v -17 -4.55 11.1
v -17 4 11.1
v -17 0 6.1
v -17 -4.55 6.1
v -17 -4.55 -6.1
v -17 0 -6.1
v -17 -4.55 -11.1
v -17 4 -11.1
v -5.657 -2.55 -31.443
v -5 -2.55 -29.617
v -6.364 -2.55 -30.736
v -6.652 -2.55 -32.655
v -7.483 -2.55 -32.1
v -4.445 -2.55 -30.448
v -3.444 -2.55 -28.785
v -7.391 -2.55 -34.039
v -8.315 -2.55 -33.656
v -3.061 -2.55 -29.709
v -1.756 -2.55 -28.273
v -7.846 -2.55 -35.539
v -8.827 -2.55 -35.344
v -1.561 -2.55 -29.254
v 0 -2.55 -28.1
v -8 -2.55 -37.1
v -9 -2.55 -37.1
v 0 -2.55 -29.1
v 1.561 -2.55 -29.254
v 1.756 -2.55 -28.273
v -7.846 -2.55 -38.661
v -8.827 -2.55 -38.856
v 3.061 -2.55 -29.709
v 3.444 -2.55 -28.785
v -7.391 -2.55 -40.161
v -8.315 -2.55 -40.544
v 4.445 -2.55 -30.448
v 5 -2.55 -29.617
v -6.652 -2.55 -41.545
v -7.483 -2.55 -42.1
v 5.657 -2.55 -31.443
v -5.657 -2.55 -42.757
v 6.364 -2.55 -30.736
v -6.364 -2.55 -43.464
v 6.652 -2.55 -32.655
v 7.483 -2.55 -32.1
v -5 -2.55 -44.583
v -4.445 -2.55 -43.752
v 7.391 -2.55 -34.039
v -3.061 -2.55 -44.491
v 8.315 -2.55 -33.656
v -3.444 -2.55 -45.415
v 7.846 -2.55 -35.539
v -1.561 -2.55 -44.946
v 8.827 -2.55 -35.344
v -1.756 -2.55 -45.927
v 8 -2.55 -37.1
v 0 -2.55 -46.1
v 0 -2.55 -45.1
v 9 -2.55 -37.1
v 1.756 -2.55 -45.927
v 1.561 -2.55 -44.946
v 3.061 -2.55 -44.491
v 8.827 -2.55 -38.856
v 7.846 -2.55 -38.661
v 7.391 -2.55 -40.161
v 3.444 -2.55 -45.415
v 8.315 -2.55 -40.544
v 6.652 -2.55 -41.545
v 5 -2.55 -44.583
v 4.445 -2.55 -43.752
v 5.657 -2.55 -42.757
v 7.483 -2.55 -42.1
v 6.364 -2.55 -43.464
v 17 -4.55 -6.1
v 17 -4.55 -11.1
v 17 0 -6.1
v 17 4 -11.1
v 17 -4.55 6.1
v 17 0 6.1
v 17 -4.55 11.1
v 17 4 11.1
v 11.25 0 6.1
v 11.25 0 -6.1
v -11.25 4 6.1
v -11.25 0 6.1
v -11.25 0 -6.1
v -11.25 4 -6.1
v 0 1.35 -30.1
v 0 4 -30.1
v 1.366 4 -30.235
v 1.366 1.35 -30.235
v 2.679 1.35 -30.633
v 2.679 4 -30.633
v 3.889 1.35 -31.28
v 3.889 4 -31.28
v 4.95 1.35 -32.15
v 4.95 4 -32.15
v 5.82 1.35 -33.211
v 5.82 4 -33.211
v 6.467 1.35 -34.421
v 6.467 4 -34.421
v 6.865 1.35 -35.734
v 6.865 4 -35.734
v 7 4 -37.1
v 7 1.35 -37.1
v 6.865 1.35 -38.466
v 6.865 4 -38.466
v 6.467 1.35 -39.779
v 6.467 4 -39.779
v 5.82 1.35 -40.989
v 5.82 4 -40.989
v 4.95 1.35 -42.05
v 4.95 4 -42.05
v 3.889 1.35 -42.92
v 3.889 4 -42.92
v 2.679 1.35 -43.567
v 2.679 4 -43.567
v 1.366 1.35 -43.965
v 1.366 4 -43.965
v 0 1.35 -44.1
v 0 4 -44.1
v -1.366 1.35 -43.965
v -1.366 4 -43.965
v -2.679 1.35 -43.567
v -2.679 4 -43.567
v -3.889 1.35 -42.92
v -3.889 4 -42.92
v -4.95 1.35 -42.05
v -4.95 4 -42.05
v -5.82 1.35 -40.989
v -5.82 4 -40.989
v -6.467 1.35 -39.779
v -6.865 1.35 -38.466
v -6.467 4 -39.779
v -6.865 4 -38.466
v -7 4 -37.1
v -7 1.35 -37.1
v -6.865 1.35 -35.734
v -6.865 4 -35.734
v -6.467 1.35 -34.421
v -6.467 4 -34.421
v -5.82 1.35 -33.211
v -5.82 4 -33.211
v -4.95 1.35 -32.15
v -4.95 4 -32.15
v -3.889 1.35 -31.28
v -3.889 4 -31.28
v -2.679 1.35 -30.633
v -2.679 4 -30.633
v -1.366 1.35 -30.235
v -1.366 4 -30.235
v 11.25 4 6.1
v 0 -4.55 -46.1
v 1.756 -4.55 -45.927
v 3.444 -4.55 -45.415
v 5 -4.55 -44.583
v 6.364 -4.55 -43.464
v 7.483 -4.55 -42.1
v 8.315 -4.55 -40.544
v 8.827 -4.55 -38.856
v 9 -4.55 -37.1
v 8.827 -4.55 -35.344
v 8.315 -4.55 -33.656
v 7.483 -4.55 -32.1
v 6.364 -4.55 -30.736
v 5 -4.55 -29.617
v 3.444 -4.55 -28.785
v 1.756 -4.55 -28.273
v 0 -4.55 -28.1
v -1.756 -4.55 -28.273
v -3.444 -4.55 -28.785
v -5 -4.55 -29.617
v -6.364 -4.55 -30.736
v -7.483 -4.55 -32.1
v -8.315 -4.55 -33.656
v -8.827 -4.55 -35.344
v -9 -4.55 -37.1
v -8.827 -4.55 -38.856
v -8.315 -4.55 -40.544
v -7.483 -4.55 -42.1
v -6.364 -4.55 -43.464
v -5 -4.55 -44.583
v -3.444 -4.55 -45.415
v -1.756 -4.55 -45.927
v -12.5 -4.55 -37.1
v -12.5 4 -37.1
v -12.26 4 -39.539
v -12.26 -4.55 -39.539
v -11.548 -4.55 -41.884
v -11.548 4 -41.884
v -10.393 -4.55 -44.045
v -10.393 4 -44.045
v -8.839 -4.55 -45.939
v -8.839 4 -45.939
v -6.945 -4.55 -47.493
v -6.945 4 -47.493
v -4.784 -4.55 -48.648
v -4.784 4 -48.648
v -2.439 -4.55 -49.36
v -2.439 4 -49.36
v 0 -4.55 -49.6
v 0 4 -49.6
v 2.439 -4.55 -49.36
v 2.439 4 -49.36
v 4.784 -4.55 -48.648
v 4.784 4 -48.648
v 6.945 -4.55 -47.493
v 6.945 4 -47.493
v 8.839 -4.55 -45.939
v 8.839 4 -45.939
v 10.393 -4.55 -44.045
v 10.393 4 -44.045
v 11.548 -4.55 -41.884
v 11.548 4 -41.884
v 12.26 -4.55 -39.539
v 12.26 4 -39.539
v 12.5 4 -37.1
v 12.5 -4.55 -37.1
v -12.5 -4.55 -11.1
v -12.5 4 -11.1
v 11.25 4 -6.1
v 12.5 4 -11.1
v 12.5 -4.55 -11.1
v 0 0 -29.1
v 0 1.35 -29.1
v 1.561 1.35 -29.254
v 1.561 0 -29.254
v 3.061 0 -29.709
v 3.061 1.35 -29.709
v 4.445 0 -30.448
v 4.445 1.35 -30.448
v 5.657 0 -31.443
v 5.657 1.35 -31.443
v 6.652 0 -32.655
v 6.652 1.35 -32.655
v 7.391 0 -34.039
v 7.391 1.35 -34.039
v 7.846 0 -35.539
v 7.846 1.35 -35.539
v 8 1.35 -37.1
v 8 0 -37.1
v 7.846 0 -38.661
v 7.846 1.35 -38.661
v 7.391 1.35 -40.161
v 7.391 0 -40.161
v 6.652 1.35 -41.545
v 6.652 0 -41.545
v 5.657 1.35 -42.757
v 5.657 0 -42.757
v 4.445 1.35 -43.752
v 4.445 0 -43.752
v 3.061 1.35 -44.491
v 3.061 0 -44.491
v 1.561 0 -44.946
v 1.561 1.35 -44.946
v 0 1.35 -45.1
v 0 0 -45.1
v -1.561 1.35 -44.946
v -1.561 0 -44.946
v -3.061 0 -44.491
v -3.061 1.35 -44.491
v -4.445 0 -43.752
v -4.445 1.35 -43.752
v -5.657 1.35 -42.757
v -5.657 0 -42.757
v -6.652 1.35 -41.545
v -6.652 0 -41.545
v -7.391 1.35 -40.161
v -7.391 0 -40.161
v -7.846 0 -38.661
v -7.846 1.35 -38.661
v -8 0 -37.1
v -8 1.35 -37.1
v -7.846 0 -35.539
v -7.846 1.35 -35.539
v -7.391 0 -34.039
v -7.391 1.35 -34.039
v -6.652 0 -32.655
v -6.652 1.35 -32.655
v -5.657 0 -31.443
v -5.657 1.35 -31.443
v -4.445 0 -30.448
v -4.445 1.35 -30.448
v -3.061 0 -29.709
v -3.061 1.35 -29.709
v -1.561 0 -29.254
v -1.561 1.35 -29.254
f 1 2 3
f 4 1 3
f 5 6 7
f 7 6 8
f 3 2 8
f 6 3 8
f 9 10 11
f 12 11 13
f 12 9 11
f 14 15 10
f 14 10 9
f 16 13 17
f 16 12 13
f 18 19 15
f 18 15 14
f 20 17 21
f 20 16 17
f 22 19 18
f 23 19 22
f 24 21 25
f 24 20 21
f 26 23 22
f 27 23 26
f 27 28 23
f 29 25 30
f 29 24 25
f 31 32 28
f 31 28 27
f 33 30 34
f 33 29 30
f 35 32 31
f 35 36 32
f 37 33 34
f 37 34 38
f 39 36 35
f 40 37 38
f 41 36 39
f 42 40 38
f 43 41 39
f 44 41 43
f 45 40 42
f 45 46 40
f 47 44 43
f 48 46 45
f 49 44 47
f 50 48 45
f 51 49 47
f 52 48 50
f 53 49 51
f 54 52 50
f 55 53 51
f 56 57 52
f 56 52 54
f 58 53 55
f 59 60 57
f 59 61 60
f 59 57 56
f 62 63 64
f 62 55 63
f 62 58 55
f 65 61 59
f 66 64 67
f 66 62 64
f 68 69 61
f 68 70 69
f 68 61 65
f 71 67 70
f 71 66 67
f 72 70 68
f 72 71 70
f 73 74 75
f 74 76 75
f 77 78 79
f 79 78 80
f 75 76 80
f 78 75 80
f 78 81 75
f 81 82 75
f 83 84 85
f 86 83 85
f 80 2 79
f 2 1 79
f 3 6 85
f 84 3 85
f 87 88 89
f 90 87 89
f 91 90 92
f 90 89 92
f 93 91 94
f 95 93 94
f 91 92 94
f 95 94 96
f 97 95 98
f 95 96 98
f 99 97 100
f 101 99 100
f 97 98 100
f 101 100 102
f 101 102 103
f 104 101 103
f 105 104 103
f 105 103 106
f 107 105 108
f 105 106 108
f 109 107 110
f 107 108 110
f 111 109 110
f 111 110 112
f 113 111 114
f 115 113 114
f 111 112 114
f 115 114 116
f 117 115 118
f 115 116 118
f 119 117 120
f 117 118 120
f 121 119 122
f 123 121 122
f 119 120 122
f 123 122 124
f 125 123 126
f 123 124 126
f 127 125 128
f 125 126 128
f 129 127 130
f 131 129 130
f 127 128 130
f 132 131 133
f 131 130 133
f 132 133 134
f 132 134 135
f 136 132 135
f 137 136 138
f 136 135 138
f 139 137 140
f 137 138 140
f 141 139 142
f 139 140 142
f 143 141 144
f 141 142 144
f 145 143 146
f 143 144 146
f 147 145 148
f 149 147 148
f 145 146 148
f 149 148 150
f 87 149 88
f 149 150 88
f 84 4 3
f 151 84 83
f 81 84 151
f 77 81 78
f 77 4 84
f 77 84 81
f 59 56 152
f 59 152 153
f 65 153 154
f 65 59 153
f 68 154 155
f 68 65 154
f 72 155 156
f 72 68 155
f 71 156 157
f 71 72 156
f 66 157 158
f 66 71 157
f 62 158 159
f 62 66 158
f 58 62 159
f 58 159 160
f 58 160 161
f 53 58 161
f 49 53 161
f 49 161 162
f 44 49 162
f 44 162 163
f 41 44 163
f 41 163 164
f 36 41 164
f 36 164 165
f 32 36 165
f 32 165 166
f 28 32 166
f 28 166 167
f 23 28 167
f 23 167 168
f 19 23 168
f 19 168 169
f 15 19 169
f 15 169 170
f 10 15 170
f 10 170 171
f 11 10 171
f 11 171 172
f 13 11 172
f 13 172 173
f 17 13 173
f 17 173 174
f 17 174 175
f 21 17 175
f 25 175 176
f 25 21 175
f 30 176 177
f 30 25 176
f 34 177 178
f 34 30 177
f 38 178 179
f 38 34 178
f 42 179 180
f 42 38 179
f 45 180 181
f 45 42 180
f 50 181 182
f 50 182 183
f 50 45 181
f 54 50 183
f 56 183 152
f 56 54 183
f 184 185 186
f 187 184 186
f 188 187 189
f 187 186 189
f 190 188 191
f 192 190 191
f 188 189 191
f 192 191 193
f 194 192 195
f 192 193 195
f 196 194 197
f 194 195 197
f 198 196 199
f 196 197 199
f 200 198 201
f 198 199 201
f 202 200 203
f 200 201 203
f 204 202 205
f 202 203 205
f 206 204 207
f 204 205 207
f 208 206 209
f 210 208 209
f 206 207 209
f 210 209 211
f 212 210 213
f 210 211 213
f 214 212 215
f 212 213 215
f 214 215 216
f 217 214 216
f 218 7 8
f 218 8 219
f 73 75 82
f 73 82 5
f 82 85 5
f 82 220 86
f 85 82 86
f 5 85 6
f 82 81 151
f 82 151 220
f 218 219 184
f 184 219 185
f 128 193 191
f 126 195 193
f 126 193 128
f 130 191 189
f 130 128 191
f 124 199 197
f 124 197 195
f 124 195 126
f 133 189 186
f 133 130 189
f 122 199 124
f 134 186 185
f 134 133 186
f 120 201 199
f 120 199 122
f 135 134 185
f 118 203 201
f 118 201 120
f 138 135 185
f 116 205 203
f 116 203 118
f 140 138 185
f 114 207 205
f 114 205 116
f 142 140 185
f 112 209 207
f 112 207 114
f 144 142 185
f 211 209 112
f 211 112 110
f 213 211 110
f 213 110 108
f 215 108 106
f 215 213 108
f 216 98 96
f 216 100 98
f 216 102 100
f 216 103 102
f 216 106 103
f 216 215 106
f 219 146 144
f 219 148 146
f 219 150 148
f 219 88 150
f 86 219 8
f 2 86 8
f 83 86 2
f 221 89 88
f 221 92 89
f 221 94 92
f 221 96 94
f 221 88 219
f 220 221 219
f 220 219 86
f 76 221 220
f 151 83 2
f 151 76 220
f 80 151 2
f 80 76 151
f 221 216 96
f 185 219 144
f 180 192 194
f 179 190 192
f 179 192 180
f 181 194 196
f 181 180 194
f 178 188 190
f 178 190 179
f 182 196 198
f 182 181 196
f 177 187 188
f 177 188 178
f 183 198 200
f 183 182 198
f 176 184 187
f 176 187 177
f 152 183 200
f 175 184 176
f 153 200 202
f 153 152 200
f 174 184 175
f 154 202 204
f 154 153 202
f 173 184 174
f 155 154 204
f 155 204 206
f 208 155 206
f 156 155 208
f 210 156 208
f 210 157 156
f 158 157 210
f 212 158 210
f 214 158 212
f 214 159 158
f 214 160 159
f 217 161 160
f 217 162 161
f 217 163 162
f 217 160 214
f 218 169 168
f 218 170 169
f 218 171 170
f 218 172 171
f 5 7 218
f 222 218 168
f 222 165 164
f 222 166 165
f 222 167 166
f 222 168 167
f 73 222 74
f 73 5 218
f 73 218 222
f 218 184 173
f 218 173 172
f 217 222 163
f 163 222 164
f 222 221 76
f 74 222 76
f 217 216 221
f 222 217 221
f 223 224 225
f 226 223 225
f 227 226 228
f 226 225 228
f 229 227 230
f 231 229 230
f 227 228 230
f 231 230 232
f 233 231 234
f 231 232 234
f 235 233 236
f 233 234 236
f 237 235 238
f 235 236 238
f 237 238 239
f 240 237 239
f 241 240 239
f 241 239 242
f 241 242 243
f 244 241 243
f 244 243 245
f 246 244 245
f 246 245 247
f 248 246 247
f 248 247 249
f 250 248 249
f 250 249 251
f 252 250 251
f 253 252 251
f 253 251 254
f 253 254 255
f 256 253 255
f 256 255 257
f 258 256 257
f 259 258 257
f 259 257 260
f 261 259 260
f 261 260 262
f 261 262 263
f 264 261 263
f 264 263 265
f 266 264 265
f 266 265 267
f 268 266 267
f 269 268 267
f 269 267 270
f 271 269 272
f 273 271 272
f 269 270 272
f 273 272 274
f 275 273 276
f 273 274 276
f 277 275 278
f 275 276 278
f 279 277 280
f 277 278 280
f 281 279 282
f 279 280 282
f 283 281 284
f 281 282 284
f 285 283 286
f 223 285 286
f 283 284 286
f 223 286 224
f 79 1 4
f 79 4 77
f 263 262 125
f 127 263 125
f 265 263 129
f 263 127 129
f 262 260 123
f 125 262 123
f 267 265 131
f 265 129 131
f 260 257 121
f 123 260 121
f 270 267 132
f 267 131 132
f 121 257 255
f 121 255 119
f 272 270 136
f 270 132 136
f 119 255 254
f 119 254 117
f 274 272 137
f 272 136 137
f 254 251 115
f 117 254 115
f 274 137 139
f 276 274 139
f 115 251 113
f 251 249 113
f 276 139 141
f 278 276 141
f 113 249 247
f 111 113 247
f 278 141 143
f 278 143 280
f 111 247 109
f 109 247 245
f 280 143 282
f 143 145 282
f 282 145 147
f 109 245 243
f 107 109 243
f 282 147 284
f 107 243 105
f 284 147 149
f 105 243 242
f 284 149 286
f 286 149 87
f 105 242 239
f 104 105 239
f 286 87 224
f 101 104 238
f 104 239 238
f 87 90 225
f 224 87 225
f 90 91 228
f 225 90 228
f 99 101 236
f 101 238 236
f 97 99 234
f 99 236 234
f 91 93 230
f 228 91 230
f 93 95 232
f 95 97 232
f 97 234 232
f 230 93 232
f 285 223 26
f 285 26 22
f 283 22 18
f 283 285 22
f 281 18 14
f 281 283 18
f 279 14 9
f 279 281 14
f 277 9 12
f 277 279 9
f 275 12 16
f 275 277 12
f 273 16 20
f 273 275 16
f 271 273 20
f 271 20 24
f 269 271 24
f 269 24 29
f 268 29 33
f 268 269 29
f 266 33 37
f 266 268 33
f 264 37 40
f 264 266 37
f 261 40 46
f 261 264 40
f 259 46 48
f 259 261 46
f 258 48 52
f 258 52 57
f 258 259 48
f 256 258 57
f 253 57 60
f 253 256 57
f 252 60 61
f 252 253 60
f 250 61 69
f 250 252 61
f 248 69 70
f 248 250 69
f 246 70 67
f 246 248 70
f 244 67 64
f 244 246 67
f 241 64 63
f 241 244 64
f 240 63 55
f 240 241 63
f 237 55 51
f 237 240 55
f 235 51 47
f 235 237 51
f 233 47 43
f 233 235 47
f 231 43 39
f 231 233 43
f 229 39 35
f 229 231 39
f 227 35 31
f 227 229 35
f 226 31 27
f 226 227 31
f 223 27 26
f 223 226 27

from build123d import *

# Parameters (mm, degrees)
SKETCH1_W           = 34
SKETCH1_H           = 22.2
SKETCH1_W_2         = 22.5
SKETCH1_H_2         = 12.2
BOSS_EXTRUDE1_DEPTH = 4
SKETCH2_R           = 8
BOSS_EXTRUDE3_DEPTH = 4
SKETCH3_R           = 9
SKETCH3_R_2         = 8
BOSS_EXTRUDE4_DEPTH = 2.55
SKETCH4_R           = 9
BOSS_EXTRUDE5_DEPTH = 4.55
SKETCH5_R           = 8
SKETCH5_R_2         = 7
BOSS_EXTRUDE8_DEPTH = 2.65


with BuildPart() as part:
    # Sketch1 → Boss-Extrude1 (new body)
    with BuildSketch(Plane(origin=(0, 0, 0), x_dir=(1, 0, 0), z_dir=(0, 1, 0))):
        Rectangle(SKETCH1_W, SKETCH1_H)
        Rectangle(SKETCH1_W_2, SKETCH1_H_2, mode=Mode.SUBTRACT)
    extrude(amount=BOSS_EXTRUDE1_DEPTH)

    # Sketch2 → Boss-Extrude3 (add, through all)
    with BuildSketch(Plane(origin=(0, 4, 0), x_dir=(1, 0, 0), z_dir=(0, 1, 0))):
        with BuildLine():
            Line((-12.5, 37.1), (-12.5, 11.1))
            Line((-12.5, 11.1), (12.5, 11.1))
            Line((12.5, 11.1), (12.5, 37.1))
            ThreePointArc((12.5, 37.1), (0, 49.6), (-12.5, 37.1))
        make_face()
        with Locations(Location((0, 37.1, 0), (0, 0, 270))):
            Circle(SKETCH2_R, mode=Mode.SUBTRACT)
    extrude(amount=-BOSS_EXTRUDE3_DEPTH)

    # Sketch3 → Boss-Extrude4 (add)
    with BuildSketch(Plane.XZ):
        with Locations(Location((0, -37.1, 0), (0, 0, 270))):
            Circle(SKETCH3_R)
        with Locations(Location((0, -37.1, 0), (0, 0, 90))):
            Circle(SKETCH3_R_2, mode=Mode.SUBTRACT)
    extrude(amount=BOSS_EXTRUDE4_DEPTH)

    # Sketch4 → Boss-Extrude5 (add)
    # profile 1 of 2: a face of its own
    with BuildSketch(Plane.XZ):
        with BuildLine():
            Line((12.5, -11.1), (17, -11.1))
            Line((17, -11.1), (17, -6.1))
            Line((17, -6.1), (11.25, -6.1))
            Line((11.25, -6.1), (-11.25, -6.1))
            Line((-11.25, -6.1), (-17, -6.1))
            Line((-17, -6.1), (-17, -11.1))
            Line((-17, -11.1), (-12.5, -11.1))
            Line((-12.5, -11.1), (-12.5, -37.1))
            ThreePointArc((-12.5, -37.1), (0, -49.6), (12.5, -37.1))
            Line((12.5, -37.1), (12.5, -11.1))
        make_face()
        with Locations(Location((0, -37.1, 0), (0, 0, 270))):
            Circle(SKETCH4_R, mode=Mode.SUBTRACT)
    # profile 2 of 2: a face of its own
    with BuildSketch(Plane.XZ):
        Polygon((11.25, 6.1), (17, 6.1), (17, 11.1), (-17, 11.1), (-17, 6.1), (-11.25, 6.1), align=None)
    extrude(amount=BOSS_EXTRUDE5_DEPTH)

    # Sketch5 → Boss-Extrude8 (add)
    with BuildSketch(Plane(origin=(0, 4, 0), x_dir=(1, 0, 0), z_dir=(0, 1, 0))):
        with Locations(Location((0, 37.1, 0), (0, 0, 270))):
            Circle(SKETCH5_R)
        with Locations(Location((0, 37.1, 0), (0, 0, 270))):
            Circle(SKETCH5_R_2, mode=Mode.SUBTRACT)
    extrude(amount=-BOSS_EXTRUDE8_DEPTH)


solid = part.part
